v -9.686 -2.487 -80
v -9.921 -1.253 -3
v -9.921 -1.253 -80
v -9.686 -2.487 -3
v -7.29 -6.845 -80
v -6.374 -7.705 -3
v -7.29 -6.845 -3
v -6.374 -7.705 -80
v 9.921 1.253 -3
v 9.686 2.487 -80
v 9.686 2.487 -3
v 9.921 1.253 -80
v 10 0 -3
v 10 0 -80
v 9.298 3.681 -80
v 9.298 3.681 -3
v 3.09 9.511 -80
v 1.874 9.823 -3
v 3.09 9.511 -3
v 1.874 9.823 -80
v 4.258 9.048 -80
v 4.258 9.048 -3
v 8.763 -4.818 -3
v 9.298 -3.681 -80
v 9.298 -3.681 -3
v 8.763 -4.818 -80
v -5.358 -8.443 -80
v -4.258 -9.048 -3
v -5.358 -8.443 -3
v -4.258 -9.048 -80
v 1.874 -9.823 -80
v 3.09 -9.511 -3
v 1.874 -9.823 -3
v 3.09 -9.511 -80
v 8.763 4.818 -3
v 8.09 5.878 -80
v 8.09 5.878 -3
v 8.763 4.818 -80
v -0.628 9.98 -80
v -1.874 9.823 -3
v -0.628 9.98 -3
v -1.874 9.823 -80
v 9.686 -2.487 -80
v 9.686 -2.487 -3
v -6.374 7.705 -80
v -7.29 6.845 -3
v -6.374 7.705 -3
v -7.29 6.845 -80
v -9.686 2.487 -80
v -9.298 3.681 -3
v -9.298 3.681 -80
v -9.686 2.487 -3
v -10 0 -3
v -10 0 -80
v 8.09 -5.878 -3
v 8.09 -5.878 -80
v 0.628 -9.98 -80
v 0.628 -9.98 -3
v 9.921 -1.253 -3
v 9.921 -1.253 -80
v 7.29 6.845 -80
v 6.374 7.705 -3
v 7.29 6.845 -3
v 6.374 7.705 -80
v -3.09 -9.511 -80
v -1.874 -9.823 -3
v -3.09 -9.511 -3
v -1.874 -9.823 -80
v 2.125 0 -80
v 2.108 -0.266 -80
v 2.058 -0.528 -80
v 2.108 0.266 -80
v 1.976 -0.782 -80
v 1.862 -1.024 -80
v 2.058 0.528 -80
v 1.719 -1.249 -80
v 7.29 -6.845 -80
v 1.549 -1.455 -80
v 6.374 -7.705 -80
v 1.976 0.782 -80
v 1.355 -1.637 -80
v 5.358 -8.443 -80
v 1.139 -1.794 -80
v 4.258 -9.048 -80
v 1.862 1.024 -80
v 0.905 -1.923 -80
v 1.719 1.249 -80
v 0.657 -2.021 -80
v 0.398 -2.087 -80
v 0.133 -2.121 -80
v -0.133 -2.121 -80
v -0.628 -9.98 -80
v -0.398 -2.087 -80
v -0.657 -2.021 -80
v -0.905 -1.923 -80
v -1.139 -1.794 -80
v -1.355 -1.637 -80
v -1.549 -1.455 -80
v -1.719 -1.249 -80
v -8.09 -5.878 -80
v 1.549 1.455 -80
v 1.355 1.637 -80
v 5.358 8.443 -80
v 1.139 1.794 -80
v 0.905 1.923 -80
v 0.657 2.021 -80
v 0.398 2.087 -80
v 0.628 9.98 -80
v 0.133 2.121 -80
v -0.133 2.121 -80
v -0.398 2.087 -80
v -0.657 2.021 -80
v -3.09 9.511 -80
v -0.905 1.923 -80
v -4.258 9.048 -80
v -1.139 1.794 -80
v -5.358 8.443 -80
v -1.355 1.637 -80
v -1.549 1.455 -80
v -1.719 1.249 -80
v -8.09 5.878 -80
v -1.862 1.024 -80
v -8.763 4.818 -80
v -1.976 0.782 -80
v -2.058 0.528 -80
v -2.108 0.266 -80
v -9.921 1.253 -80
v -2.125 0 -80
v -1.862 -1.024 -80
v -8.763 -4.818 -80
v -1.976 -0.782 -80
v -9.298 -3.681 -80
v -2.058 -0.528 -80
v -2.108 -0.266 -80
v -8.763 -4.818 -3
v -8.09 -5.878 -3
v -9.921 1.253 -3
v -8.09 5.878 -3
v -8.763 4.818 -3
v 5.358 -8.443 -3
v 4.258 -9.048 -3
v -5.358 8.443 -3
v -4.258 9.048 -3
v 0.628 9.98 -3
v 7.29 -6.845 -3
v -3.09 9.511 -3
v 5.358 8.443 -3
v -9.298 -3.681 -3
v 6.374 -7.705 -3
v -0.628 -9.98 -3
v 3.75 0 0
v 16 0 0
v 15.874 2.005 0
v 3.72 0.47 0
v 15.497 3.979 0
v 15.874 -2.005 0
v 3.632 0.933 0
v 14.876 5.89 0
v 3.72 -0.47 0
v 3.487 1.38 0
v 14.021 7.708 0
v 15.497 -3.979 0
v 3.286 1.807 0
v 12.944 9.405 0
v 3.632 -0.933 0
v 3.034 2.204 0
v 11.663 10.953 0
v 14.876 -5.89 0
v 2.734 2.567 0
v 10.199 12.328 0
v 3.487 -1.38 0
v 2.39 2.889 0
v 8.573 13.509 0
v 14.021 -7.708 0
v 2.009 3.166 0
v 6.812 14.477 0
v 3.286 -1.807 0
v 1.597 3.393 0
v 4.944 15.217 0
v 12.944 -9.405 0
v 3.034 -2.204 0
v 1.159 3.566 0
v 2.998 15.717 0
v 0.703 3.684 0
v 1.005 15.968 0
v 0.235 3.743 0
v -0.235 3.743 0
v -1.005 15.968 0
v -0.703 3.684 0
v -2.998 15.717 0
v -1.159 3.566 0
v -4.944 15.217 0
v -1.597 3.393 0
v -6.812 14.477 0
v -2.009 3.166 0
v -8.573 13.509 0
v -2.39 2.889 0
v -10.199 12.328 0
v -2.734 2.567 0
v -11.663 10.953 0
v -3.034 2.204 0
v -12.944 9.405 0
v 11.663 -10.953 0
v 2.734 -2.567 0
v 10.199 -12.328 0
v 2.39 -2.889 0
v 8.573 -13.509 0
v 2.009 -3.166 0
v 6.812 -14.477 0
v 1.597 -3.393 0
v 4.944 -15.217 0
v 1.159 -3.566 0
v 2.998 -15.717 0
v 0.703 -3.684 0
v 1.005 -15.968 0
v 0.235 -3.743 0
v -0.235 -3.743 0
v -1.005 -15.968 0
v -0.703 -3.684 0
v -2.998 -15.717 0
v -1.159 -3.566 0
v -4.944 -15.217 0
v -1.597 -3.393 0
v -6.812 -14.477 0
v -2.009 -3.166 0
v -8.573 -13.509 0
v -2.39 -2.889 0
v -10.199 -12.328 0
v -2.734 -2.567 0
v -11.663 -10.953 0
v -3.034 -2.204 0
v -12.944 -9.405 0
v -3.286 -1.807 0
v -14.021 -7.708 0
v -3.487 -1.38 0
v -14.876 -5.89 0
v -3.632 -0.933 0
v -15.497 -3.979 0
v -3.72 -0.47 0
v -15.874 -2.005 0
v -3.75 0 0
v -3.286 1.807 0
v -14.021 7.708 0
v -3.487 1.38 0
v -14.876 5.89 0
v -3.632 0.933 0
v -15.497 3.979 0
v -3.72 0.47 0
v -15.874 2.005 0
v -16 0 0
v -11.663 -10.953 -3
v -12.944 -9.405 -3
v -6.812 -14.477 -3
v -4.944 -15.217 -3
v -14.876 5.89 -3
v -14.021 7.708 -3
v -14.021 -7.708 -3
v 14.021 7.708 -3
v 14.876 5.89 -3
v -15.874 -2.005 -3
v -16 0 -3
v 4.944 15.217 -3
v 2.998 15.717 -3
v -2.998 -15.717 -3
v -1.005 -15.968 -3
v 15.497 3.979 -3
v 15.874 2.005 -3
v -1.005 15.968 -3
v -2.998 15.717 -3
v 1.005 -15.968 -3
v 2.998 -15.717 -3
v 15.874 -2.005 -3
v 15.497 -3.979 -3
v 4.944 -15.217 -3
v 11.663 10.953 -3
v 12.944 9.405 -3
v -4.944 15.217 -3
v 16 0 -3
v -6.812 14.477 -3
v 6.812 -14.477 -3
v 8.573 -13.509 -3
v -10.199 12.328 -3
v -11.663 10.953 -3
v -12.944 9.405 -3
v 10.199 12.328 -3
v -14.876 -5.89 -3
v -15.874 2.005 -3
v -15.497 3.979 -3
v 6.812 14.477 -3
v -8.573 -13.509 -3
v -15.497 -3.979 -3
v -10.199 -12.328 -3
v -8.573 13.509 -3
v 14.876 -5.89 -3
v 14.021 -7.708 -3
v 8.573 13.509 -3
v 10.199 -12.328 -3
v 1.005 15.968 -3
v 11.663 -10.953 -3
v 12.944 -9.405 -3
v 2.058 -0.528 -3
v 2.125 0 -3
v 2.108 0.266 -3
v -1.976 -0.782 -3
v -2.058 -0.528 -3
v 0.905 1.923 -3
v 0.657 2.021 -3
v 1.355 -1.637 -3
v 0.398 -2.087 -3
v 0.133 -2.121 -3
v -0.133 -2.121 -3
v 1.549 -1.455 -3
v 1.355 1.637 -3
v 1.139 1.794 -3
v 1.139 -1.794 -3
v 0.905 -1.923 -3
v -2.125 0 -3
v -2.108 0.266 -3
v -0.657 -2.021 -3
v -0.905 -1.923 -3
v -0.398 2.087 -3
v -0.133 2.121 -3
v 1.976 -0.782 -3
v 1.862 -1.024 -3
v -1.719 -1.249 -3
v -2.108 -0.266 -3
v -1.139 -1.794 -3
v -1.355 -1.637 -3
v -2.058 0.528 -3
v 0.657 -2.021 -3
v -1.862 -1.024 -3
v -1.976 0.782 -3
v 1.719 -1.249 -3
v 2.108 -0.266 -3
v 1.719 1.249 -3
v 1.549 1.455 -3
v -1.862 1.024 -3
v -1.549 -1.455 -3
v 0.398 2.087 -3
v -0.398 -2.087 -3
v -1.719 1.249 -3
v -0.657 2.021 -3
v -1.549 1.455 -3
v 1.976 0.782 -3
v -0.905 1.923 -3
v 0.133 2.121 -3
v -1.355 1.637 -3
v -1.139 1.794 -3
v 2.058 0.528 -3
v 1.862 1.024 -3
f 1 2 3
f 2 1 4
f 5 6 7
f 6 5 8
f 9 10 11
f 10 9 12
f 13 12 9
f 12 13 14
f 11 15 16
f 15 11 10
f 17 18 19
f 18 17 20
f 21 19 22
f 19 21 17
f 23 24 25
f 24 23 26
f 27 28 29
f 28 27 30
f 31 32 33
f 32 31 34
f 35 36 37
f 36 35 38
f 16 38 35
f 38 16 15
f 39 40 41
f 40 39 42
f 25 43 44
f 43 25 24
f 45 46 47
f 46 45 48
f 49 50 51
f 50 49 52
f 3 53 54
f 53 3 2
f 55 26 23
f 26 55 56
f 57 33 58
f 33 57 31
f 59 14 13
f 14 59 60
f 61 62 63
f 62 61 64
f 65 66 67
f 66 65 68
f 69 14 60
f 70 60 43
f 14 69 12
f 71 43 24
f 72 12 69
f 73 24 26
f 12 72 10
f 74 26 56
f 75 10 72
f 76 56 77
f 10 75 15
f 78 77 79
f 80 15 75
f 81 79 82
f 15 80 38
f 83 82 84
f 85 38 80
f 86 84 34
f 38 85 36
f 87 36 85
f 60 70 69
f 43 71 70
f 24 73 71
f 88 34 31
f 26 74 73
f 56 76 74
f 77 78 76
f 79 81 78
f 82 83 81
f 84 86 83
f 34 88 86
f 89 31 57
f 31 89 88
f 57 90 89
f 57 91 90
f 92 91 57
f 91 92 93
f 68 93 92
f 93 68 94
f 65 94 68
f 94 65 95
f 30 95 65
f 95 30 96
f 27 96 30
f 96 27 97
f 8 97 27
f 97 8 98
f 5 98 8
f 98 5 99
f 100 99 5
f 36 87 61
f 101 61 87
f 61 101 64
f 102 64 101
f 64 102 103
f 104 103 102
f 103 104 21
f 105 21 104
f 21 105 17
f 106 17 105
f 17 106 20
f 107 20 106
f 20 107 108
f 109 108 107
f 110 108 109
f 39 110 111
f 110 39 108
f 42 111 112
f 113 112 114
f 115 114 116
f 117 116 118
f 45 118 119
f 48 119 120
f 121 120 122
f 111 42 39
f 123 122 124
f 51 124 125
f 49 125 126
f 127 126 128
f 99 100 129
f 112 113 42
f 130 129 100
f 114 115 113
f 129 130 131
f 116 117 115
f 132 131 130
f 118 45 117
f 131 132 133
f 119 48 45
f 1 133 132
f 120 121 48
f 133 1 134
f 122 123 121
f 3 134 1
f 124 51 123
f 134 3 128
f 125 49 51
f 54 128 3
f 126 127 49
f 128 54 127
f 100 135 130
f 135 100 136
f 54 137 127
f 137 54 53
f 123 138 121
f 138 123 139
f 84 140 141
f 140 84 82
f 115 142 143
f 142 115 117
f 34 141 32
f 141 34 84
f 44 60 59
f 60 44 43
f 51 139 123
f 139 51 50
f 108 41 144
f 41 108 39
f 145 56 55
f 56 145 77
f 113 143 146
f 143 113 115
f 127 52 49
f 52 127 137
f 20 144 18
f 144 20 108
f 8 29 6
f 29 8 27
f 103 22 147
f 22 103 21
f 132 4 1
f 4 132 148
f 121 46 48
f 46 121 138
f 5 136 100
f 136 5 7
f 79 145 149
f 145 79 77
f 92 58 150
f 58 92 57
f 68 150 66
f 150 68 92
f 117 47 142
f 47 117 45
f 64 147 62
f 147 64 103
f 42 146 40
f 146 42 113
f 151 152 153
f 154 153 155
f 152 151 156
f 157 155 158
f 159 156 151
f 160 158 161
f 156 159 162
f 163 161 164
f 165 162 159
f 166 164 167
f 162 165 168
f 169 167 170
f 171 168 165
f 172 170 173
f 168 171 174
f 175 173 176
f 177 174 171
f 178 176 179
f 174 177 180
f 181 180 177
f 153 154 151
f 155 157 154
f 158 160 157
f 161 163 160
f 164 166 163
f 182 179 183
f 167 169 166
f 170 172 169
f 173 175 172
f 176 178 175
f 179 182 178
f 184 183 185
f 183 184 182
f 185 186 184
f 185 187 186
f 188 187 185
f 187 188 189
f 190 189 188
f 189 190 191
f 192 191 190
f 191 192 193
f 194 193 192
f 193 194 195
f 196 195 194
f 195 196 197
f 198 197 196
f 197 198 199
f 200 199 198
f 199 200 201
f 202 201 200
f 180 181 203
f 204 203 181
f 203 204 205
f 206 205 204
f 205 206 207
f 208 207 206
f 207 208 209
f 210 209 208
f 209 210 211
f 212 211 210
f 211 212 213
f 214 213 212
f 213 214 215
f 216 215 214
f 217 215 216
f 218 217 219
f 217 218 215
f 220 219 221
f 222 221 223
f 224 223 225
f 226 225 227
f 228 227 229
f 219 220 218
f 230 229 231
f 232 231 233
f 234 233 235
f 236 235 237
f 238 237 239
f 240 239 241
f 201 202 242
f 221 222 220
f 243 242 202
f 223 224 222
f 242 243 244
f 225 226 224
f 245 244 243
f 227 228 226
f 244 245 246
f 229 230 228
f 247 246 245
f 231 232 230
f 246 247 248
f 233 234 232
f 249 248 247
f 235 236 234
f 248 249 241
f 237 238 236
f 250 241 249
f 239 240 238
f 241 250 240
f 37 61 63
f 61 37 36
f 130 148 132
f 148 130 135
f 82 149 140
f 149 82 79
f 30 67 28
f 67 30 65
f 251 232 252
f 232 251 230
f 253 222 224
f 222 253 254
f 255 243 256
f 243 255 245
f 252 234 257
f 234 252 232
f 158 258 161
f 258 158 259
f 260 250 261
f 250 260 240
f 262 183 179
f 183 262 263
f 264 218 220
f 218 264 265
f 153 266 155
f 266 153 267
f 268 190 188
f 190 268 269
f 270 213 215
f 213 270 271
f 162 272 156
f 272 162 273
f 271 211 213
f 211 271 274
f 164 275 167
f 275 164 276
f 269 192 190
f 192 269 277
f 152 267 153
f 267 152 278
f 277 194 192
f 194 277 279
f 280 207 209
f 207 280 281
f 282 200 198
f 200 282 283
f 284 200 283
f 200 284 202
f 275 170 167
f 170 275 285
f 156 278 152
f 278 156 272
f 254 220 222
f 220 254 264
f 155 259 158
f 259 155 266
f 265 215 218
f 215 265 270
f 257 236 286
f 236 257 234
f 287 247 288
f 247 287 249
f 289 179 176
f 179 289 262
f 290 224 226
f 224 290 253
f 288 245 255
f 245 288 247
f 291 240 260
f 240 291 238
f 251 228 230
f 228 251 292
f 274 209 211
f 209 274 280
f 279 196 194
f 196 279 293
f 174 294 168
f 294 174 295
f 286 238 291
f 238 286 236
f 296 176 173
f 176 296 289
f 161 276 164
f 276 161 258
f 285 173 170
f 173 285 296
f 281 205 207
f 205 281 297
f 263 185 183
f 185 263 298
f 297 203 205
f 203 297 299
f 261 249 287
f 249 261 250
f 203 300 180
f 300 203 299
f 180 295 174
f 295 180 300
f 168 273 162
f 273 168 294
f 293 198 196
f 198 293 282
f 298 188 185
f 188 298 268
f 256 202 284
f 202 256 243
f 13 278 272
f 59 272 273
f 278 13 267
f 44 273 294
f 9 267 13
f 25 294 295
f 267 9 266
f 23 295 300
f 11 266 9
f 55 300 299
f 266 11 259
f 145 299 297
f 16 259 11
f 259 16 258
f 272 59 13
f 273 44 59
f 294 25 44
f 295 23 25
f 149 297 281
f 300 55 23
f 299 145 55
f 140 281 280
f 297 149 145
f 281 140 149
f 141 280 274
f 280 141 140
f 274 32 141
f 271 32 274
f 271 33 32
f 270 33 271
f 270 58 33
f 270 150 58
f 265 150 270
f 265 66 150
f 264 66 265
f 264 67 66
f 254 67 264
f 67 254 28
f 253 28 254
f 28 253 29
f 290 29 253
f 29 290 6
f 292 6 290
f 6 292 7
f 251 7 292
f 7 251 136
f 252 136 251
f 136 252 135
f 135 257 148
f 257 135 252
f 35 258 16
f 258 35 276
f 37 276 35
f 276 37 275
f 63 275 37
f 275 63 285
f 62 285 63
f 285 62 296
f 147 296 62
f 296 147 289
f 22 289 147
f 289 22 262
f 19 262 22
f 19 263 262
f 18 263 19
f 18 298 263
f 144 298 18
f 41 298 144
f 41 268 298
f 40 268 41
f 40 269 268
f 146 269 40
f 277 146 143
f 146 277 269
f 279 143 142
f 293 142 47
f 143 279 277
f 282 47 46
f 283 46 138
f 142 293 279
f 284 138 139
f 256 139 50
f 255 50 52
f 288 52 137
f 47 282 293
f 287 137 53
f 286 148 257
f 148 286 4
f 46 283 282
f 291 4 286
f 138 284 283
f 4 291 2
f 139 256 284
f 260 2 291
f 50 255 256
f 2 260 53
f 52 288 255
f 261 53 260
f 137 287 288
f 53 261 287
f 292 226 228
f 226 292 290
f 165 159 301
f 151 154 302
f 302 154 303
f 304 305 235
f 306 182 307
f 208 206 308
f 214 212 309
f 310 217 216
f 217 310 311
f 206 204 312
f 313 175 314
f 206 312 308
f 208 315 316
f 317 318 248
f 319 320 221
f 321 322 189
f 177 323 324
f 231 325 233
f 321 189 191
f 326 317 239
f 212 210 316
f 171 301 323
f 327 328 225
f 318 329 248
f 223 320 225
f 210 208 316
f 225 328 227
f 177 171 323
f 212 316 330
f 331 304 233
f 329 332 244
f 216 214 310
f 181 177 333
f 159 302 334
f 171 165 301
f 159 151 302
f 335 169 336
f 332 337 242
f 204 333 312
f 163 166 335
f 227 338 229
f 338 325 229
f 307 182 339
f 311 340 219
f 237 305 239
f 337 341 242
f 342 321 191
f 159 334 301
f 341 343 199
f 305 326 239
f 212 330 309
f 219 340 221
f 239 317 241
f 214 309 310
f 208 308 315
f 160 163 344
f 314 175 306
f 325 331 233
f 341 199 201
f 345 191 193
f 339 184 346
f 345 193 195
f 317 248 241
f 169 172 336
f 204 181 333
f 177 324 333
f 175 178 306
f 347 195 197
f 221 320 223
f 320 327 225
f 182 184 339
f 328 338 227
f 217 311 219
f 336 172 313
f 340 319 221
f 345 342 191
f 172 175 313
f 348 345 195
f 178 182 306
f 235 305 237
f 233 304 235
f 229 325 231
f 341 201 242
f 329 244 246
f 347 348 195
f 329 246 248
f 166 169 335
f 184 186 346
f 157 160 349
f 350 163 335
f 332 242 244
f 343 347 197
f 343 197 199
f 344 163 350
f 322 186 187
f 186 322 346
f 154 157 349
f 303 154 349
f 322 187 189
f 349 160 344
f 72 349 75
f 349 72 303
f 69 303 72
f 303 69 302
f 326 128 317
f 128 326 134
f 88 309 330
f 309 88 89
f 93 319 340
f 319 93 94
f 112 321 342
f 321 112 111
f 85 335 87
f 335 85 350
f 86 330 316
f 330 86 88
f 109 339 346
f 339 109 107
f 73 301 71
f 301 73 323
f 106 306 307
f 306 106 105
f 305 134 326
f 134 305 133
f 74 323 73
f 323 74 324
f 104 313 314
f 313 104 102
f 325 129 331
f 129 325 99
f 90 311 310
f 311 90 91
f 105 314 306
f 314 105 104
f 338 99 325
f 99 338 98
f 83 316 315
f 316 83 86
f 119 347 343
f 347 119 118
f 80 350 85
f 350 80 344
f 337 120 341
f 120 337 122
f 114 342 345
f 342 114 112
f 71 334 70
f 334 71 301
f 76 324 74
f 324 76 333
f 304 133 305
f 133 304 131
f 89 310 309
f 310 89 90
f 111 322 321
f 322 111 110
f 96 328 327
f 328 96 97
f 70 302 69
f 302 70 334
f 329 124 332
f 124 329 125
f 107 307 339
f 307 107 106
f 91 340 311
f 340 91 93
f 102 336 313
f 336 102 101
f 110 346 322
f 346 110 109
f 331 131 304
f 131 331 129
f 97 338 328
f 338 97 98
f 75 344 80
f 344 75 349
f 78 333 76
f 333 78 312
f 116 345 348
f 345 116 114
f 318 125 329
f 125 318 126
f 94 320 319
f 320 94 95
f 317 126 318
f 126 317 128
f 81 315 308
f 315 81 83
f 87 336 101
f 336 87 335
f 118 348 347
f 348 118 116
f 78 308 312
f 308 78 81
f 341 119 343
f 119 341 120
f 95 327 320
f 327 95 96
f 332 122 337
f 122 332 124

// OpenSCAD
$fn = 50;


difference() {
	union() {
		translate(v = [0, 0, -80.0000000000]) {
			cylinder(h = 80, r = 10.0000000000);
		}
		translate(v = [0, 0, -3.0000000000]) {
			cylinder(h = 3, r = 16.0000000000);
		}
	}
	union() {
		translate(v = [0, 0, 0]) {
			rotate(a = [0, 0, 0]) {
				difference() {
					union() {
						#translate(v = [0, 0, -80.0000000000]) {
							cylinder(h = 80, r = 2.0000000000);
						}
						#translate(v = [0, 0, -3]) {
							cylinder(h = 3, r1 = 2.1250000000, r2 = 3.7500000000);
						}
						#translate(v = [0, 0, -80.0000000000]) {
							cylinder(h = 80, r = 2.1250000000);
						}
						#translate(v = [0, 0, -80.0000000000]) {
							cylinder(h = 80, r = 2.0000000000);
						}
					}
					union();
				}
			}
		}
	}
}
